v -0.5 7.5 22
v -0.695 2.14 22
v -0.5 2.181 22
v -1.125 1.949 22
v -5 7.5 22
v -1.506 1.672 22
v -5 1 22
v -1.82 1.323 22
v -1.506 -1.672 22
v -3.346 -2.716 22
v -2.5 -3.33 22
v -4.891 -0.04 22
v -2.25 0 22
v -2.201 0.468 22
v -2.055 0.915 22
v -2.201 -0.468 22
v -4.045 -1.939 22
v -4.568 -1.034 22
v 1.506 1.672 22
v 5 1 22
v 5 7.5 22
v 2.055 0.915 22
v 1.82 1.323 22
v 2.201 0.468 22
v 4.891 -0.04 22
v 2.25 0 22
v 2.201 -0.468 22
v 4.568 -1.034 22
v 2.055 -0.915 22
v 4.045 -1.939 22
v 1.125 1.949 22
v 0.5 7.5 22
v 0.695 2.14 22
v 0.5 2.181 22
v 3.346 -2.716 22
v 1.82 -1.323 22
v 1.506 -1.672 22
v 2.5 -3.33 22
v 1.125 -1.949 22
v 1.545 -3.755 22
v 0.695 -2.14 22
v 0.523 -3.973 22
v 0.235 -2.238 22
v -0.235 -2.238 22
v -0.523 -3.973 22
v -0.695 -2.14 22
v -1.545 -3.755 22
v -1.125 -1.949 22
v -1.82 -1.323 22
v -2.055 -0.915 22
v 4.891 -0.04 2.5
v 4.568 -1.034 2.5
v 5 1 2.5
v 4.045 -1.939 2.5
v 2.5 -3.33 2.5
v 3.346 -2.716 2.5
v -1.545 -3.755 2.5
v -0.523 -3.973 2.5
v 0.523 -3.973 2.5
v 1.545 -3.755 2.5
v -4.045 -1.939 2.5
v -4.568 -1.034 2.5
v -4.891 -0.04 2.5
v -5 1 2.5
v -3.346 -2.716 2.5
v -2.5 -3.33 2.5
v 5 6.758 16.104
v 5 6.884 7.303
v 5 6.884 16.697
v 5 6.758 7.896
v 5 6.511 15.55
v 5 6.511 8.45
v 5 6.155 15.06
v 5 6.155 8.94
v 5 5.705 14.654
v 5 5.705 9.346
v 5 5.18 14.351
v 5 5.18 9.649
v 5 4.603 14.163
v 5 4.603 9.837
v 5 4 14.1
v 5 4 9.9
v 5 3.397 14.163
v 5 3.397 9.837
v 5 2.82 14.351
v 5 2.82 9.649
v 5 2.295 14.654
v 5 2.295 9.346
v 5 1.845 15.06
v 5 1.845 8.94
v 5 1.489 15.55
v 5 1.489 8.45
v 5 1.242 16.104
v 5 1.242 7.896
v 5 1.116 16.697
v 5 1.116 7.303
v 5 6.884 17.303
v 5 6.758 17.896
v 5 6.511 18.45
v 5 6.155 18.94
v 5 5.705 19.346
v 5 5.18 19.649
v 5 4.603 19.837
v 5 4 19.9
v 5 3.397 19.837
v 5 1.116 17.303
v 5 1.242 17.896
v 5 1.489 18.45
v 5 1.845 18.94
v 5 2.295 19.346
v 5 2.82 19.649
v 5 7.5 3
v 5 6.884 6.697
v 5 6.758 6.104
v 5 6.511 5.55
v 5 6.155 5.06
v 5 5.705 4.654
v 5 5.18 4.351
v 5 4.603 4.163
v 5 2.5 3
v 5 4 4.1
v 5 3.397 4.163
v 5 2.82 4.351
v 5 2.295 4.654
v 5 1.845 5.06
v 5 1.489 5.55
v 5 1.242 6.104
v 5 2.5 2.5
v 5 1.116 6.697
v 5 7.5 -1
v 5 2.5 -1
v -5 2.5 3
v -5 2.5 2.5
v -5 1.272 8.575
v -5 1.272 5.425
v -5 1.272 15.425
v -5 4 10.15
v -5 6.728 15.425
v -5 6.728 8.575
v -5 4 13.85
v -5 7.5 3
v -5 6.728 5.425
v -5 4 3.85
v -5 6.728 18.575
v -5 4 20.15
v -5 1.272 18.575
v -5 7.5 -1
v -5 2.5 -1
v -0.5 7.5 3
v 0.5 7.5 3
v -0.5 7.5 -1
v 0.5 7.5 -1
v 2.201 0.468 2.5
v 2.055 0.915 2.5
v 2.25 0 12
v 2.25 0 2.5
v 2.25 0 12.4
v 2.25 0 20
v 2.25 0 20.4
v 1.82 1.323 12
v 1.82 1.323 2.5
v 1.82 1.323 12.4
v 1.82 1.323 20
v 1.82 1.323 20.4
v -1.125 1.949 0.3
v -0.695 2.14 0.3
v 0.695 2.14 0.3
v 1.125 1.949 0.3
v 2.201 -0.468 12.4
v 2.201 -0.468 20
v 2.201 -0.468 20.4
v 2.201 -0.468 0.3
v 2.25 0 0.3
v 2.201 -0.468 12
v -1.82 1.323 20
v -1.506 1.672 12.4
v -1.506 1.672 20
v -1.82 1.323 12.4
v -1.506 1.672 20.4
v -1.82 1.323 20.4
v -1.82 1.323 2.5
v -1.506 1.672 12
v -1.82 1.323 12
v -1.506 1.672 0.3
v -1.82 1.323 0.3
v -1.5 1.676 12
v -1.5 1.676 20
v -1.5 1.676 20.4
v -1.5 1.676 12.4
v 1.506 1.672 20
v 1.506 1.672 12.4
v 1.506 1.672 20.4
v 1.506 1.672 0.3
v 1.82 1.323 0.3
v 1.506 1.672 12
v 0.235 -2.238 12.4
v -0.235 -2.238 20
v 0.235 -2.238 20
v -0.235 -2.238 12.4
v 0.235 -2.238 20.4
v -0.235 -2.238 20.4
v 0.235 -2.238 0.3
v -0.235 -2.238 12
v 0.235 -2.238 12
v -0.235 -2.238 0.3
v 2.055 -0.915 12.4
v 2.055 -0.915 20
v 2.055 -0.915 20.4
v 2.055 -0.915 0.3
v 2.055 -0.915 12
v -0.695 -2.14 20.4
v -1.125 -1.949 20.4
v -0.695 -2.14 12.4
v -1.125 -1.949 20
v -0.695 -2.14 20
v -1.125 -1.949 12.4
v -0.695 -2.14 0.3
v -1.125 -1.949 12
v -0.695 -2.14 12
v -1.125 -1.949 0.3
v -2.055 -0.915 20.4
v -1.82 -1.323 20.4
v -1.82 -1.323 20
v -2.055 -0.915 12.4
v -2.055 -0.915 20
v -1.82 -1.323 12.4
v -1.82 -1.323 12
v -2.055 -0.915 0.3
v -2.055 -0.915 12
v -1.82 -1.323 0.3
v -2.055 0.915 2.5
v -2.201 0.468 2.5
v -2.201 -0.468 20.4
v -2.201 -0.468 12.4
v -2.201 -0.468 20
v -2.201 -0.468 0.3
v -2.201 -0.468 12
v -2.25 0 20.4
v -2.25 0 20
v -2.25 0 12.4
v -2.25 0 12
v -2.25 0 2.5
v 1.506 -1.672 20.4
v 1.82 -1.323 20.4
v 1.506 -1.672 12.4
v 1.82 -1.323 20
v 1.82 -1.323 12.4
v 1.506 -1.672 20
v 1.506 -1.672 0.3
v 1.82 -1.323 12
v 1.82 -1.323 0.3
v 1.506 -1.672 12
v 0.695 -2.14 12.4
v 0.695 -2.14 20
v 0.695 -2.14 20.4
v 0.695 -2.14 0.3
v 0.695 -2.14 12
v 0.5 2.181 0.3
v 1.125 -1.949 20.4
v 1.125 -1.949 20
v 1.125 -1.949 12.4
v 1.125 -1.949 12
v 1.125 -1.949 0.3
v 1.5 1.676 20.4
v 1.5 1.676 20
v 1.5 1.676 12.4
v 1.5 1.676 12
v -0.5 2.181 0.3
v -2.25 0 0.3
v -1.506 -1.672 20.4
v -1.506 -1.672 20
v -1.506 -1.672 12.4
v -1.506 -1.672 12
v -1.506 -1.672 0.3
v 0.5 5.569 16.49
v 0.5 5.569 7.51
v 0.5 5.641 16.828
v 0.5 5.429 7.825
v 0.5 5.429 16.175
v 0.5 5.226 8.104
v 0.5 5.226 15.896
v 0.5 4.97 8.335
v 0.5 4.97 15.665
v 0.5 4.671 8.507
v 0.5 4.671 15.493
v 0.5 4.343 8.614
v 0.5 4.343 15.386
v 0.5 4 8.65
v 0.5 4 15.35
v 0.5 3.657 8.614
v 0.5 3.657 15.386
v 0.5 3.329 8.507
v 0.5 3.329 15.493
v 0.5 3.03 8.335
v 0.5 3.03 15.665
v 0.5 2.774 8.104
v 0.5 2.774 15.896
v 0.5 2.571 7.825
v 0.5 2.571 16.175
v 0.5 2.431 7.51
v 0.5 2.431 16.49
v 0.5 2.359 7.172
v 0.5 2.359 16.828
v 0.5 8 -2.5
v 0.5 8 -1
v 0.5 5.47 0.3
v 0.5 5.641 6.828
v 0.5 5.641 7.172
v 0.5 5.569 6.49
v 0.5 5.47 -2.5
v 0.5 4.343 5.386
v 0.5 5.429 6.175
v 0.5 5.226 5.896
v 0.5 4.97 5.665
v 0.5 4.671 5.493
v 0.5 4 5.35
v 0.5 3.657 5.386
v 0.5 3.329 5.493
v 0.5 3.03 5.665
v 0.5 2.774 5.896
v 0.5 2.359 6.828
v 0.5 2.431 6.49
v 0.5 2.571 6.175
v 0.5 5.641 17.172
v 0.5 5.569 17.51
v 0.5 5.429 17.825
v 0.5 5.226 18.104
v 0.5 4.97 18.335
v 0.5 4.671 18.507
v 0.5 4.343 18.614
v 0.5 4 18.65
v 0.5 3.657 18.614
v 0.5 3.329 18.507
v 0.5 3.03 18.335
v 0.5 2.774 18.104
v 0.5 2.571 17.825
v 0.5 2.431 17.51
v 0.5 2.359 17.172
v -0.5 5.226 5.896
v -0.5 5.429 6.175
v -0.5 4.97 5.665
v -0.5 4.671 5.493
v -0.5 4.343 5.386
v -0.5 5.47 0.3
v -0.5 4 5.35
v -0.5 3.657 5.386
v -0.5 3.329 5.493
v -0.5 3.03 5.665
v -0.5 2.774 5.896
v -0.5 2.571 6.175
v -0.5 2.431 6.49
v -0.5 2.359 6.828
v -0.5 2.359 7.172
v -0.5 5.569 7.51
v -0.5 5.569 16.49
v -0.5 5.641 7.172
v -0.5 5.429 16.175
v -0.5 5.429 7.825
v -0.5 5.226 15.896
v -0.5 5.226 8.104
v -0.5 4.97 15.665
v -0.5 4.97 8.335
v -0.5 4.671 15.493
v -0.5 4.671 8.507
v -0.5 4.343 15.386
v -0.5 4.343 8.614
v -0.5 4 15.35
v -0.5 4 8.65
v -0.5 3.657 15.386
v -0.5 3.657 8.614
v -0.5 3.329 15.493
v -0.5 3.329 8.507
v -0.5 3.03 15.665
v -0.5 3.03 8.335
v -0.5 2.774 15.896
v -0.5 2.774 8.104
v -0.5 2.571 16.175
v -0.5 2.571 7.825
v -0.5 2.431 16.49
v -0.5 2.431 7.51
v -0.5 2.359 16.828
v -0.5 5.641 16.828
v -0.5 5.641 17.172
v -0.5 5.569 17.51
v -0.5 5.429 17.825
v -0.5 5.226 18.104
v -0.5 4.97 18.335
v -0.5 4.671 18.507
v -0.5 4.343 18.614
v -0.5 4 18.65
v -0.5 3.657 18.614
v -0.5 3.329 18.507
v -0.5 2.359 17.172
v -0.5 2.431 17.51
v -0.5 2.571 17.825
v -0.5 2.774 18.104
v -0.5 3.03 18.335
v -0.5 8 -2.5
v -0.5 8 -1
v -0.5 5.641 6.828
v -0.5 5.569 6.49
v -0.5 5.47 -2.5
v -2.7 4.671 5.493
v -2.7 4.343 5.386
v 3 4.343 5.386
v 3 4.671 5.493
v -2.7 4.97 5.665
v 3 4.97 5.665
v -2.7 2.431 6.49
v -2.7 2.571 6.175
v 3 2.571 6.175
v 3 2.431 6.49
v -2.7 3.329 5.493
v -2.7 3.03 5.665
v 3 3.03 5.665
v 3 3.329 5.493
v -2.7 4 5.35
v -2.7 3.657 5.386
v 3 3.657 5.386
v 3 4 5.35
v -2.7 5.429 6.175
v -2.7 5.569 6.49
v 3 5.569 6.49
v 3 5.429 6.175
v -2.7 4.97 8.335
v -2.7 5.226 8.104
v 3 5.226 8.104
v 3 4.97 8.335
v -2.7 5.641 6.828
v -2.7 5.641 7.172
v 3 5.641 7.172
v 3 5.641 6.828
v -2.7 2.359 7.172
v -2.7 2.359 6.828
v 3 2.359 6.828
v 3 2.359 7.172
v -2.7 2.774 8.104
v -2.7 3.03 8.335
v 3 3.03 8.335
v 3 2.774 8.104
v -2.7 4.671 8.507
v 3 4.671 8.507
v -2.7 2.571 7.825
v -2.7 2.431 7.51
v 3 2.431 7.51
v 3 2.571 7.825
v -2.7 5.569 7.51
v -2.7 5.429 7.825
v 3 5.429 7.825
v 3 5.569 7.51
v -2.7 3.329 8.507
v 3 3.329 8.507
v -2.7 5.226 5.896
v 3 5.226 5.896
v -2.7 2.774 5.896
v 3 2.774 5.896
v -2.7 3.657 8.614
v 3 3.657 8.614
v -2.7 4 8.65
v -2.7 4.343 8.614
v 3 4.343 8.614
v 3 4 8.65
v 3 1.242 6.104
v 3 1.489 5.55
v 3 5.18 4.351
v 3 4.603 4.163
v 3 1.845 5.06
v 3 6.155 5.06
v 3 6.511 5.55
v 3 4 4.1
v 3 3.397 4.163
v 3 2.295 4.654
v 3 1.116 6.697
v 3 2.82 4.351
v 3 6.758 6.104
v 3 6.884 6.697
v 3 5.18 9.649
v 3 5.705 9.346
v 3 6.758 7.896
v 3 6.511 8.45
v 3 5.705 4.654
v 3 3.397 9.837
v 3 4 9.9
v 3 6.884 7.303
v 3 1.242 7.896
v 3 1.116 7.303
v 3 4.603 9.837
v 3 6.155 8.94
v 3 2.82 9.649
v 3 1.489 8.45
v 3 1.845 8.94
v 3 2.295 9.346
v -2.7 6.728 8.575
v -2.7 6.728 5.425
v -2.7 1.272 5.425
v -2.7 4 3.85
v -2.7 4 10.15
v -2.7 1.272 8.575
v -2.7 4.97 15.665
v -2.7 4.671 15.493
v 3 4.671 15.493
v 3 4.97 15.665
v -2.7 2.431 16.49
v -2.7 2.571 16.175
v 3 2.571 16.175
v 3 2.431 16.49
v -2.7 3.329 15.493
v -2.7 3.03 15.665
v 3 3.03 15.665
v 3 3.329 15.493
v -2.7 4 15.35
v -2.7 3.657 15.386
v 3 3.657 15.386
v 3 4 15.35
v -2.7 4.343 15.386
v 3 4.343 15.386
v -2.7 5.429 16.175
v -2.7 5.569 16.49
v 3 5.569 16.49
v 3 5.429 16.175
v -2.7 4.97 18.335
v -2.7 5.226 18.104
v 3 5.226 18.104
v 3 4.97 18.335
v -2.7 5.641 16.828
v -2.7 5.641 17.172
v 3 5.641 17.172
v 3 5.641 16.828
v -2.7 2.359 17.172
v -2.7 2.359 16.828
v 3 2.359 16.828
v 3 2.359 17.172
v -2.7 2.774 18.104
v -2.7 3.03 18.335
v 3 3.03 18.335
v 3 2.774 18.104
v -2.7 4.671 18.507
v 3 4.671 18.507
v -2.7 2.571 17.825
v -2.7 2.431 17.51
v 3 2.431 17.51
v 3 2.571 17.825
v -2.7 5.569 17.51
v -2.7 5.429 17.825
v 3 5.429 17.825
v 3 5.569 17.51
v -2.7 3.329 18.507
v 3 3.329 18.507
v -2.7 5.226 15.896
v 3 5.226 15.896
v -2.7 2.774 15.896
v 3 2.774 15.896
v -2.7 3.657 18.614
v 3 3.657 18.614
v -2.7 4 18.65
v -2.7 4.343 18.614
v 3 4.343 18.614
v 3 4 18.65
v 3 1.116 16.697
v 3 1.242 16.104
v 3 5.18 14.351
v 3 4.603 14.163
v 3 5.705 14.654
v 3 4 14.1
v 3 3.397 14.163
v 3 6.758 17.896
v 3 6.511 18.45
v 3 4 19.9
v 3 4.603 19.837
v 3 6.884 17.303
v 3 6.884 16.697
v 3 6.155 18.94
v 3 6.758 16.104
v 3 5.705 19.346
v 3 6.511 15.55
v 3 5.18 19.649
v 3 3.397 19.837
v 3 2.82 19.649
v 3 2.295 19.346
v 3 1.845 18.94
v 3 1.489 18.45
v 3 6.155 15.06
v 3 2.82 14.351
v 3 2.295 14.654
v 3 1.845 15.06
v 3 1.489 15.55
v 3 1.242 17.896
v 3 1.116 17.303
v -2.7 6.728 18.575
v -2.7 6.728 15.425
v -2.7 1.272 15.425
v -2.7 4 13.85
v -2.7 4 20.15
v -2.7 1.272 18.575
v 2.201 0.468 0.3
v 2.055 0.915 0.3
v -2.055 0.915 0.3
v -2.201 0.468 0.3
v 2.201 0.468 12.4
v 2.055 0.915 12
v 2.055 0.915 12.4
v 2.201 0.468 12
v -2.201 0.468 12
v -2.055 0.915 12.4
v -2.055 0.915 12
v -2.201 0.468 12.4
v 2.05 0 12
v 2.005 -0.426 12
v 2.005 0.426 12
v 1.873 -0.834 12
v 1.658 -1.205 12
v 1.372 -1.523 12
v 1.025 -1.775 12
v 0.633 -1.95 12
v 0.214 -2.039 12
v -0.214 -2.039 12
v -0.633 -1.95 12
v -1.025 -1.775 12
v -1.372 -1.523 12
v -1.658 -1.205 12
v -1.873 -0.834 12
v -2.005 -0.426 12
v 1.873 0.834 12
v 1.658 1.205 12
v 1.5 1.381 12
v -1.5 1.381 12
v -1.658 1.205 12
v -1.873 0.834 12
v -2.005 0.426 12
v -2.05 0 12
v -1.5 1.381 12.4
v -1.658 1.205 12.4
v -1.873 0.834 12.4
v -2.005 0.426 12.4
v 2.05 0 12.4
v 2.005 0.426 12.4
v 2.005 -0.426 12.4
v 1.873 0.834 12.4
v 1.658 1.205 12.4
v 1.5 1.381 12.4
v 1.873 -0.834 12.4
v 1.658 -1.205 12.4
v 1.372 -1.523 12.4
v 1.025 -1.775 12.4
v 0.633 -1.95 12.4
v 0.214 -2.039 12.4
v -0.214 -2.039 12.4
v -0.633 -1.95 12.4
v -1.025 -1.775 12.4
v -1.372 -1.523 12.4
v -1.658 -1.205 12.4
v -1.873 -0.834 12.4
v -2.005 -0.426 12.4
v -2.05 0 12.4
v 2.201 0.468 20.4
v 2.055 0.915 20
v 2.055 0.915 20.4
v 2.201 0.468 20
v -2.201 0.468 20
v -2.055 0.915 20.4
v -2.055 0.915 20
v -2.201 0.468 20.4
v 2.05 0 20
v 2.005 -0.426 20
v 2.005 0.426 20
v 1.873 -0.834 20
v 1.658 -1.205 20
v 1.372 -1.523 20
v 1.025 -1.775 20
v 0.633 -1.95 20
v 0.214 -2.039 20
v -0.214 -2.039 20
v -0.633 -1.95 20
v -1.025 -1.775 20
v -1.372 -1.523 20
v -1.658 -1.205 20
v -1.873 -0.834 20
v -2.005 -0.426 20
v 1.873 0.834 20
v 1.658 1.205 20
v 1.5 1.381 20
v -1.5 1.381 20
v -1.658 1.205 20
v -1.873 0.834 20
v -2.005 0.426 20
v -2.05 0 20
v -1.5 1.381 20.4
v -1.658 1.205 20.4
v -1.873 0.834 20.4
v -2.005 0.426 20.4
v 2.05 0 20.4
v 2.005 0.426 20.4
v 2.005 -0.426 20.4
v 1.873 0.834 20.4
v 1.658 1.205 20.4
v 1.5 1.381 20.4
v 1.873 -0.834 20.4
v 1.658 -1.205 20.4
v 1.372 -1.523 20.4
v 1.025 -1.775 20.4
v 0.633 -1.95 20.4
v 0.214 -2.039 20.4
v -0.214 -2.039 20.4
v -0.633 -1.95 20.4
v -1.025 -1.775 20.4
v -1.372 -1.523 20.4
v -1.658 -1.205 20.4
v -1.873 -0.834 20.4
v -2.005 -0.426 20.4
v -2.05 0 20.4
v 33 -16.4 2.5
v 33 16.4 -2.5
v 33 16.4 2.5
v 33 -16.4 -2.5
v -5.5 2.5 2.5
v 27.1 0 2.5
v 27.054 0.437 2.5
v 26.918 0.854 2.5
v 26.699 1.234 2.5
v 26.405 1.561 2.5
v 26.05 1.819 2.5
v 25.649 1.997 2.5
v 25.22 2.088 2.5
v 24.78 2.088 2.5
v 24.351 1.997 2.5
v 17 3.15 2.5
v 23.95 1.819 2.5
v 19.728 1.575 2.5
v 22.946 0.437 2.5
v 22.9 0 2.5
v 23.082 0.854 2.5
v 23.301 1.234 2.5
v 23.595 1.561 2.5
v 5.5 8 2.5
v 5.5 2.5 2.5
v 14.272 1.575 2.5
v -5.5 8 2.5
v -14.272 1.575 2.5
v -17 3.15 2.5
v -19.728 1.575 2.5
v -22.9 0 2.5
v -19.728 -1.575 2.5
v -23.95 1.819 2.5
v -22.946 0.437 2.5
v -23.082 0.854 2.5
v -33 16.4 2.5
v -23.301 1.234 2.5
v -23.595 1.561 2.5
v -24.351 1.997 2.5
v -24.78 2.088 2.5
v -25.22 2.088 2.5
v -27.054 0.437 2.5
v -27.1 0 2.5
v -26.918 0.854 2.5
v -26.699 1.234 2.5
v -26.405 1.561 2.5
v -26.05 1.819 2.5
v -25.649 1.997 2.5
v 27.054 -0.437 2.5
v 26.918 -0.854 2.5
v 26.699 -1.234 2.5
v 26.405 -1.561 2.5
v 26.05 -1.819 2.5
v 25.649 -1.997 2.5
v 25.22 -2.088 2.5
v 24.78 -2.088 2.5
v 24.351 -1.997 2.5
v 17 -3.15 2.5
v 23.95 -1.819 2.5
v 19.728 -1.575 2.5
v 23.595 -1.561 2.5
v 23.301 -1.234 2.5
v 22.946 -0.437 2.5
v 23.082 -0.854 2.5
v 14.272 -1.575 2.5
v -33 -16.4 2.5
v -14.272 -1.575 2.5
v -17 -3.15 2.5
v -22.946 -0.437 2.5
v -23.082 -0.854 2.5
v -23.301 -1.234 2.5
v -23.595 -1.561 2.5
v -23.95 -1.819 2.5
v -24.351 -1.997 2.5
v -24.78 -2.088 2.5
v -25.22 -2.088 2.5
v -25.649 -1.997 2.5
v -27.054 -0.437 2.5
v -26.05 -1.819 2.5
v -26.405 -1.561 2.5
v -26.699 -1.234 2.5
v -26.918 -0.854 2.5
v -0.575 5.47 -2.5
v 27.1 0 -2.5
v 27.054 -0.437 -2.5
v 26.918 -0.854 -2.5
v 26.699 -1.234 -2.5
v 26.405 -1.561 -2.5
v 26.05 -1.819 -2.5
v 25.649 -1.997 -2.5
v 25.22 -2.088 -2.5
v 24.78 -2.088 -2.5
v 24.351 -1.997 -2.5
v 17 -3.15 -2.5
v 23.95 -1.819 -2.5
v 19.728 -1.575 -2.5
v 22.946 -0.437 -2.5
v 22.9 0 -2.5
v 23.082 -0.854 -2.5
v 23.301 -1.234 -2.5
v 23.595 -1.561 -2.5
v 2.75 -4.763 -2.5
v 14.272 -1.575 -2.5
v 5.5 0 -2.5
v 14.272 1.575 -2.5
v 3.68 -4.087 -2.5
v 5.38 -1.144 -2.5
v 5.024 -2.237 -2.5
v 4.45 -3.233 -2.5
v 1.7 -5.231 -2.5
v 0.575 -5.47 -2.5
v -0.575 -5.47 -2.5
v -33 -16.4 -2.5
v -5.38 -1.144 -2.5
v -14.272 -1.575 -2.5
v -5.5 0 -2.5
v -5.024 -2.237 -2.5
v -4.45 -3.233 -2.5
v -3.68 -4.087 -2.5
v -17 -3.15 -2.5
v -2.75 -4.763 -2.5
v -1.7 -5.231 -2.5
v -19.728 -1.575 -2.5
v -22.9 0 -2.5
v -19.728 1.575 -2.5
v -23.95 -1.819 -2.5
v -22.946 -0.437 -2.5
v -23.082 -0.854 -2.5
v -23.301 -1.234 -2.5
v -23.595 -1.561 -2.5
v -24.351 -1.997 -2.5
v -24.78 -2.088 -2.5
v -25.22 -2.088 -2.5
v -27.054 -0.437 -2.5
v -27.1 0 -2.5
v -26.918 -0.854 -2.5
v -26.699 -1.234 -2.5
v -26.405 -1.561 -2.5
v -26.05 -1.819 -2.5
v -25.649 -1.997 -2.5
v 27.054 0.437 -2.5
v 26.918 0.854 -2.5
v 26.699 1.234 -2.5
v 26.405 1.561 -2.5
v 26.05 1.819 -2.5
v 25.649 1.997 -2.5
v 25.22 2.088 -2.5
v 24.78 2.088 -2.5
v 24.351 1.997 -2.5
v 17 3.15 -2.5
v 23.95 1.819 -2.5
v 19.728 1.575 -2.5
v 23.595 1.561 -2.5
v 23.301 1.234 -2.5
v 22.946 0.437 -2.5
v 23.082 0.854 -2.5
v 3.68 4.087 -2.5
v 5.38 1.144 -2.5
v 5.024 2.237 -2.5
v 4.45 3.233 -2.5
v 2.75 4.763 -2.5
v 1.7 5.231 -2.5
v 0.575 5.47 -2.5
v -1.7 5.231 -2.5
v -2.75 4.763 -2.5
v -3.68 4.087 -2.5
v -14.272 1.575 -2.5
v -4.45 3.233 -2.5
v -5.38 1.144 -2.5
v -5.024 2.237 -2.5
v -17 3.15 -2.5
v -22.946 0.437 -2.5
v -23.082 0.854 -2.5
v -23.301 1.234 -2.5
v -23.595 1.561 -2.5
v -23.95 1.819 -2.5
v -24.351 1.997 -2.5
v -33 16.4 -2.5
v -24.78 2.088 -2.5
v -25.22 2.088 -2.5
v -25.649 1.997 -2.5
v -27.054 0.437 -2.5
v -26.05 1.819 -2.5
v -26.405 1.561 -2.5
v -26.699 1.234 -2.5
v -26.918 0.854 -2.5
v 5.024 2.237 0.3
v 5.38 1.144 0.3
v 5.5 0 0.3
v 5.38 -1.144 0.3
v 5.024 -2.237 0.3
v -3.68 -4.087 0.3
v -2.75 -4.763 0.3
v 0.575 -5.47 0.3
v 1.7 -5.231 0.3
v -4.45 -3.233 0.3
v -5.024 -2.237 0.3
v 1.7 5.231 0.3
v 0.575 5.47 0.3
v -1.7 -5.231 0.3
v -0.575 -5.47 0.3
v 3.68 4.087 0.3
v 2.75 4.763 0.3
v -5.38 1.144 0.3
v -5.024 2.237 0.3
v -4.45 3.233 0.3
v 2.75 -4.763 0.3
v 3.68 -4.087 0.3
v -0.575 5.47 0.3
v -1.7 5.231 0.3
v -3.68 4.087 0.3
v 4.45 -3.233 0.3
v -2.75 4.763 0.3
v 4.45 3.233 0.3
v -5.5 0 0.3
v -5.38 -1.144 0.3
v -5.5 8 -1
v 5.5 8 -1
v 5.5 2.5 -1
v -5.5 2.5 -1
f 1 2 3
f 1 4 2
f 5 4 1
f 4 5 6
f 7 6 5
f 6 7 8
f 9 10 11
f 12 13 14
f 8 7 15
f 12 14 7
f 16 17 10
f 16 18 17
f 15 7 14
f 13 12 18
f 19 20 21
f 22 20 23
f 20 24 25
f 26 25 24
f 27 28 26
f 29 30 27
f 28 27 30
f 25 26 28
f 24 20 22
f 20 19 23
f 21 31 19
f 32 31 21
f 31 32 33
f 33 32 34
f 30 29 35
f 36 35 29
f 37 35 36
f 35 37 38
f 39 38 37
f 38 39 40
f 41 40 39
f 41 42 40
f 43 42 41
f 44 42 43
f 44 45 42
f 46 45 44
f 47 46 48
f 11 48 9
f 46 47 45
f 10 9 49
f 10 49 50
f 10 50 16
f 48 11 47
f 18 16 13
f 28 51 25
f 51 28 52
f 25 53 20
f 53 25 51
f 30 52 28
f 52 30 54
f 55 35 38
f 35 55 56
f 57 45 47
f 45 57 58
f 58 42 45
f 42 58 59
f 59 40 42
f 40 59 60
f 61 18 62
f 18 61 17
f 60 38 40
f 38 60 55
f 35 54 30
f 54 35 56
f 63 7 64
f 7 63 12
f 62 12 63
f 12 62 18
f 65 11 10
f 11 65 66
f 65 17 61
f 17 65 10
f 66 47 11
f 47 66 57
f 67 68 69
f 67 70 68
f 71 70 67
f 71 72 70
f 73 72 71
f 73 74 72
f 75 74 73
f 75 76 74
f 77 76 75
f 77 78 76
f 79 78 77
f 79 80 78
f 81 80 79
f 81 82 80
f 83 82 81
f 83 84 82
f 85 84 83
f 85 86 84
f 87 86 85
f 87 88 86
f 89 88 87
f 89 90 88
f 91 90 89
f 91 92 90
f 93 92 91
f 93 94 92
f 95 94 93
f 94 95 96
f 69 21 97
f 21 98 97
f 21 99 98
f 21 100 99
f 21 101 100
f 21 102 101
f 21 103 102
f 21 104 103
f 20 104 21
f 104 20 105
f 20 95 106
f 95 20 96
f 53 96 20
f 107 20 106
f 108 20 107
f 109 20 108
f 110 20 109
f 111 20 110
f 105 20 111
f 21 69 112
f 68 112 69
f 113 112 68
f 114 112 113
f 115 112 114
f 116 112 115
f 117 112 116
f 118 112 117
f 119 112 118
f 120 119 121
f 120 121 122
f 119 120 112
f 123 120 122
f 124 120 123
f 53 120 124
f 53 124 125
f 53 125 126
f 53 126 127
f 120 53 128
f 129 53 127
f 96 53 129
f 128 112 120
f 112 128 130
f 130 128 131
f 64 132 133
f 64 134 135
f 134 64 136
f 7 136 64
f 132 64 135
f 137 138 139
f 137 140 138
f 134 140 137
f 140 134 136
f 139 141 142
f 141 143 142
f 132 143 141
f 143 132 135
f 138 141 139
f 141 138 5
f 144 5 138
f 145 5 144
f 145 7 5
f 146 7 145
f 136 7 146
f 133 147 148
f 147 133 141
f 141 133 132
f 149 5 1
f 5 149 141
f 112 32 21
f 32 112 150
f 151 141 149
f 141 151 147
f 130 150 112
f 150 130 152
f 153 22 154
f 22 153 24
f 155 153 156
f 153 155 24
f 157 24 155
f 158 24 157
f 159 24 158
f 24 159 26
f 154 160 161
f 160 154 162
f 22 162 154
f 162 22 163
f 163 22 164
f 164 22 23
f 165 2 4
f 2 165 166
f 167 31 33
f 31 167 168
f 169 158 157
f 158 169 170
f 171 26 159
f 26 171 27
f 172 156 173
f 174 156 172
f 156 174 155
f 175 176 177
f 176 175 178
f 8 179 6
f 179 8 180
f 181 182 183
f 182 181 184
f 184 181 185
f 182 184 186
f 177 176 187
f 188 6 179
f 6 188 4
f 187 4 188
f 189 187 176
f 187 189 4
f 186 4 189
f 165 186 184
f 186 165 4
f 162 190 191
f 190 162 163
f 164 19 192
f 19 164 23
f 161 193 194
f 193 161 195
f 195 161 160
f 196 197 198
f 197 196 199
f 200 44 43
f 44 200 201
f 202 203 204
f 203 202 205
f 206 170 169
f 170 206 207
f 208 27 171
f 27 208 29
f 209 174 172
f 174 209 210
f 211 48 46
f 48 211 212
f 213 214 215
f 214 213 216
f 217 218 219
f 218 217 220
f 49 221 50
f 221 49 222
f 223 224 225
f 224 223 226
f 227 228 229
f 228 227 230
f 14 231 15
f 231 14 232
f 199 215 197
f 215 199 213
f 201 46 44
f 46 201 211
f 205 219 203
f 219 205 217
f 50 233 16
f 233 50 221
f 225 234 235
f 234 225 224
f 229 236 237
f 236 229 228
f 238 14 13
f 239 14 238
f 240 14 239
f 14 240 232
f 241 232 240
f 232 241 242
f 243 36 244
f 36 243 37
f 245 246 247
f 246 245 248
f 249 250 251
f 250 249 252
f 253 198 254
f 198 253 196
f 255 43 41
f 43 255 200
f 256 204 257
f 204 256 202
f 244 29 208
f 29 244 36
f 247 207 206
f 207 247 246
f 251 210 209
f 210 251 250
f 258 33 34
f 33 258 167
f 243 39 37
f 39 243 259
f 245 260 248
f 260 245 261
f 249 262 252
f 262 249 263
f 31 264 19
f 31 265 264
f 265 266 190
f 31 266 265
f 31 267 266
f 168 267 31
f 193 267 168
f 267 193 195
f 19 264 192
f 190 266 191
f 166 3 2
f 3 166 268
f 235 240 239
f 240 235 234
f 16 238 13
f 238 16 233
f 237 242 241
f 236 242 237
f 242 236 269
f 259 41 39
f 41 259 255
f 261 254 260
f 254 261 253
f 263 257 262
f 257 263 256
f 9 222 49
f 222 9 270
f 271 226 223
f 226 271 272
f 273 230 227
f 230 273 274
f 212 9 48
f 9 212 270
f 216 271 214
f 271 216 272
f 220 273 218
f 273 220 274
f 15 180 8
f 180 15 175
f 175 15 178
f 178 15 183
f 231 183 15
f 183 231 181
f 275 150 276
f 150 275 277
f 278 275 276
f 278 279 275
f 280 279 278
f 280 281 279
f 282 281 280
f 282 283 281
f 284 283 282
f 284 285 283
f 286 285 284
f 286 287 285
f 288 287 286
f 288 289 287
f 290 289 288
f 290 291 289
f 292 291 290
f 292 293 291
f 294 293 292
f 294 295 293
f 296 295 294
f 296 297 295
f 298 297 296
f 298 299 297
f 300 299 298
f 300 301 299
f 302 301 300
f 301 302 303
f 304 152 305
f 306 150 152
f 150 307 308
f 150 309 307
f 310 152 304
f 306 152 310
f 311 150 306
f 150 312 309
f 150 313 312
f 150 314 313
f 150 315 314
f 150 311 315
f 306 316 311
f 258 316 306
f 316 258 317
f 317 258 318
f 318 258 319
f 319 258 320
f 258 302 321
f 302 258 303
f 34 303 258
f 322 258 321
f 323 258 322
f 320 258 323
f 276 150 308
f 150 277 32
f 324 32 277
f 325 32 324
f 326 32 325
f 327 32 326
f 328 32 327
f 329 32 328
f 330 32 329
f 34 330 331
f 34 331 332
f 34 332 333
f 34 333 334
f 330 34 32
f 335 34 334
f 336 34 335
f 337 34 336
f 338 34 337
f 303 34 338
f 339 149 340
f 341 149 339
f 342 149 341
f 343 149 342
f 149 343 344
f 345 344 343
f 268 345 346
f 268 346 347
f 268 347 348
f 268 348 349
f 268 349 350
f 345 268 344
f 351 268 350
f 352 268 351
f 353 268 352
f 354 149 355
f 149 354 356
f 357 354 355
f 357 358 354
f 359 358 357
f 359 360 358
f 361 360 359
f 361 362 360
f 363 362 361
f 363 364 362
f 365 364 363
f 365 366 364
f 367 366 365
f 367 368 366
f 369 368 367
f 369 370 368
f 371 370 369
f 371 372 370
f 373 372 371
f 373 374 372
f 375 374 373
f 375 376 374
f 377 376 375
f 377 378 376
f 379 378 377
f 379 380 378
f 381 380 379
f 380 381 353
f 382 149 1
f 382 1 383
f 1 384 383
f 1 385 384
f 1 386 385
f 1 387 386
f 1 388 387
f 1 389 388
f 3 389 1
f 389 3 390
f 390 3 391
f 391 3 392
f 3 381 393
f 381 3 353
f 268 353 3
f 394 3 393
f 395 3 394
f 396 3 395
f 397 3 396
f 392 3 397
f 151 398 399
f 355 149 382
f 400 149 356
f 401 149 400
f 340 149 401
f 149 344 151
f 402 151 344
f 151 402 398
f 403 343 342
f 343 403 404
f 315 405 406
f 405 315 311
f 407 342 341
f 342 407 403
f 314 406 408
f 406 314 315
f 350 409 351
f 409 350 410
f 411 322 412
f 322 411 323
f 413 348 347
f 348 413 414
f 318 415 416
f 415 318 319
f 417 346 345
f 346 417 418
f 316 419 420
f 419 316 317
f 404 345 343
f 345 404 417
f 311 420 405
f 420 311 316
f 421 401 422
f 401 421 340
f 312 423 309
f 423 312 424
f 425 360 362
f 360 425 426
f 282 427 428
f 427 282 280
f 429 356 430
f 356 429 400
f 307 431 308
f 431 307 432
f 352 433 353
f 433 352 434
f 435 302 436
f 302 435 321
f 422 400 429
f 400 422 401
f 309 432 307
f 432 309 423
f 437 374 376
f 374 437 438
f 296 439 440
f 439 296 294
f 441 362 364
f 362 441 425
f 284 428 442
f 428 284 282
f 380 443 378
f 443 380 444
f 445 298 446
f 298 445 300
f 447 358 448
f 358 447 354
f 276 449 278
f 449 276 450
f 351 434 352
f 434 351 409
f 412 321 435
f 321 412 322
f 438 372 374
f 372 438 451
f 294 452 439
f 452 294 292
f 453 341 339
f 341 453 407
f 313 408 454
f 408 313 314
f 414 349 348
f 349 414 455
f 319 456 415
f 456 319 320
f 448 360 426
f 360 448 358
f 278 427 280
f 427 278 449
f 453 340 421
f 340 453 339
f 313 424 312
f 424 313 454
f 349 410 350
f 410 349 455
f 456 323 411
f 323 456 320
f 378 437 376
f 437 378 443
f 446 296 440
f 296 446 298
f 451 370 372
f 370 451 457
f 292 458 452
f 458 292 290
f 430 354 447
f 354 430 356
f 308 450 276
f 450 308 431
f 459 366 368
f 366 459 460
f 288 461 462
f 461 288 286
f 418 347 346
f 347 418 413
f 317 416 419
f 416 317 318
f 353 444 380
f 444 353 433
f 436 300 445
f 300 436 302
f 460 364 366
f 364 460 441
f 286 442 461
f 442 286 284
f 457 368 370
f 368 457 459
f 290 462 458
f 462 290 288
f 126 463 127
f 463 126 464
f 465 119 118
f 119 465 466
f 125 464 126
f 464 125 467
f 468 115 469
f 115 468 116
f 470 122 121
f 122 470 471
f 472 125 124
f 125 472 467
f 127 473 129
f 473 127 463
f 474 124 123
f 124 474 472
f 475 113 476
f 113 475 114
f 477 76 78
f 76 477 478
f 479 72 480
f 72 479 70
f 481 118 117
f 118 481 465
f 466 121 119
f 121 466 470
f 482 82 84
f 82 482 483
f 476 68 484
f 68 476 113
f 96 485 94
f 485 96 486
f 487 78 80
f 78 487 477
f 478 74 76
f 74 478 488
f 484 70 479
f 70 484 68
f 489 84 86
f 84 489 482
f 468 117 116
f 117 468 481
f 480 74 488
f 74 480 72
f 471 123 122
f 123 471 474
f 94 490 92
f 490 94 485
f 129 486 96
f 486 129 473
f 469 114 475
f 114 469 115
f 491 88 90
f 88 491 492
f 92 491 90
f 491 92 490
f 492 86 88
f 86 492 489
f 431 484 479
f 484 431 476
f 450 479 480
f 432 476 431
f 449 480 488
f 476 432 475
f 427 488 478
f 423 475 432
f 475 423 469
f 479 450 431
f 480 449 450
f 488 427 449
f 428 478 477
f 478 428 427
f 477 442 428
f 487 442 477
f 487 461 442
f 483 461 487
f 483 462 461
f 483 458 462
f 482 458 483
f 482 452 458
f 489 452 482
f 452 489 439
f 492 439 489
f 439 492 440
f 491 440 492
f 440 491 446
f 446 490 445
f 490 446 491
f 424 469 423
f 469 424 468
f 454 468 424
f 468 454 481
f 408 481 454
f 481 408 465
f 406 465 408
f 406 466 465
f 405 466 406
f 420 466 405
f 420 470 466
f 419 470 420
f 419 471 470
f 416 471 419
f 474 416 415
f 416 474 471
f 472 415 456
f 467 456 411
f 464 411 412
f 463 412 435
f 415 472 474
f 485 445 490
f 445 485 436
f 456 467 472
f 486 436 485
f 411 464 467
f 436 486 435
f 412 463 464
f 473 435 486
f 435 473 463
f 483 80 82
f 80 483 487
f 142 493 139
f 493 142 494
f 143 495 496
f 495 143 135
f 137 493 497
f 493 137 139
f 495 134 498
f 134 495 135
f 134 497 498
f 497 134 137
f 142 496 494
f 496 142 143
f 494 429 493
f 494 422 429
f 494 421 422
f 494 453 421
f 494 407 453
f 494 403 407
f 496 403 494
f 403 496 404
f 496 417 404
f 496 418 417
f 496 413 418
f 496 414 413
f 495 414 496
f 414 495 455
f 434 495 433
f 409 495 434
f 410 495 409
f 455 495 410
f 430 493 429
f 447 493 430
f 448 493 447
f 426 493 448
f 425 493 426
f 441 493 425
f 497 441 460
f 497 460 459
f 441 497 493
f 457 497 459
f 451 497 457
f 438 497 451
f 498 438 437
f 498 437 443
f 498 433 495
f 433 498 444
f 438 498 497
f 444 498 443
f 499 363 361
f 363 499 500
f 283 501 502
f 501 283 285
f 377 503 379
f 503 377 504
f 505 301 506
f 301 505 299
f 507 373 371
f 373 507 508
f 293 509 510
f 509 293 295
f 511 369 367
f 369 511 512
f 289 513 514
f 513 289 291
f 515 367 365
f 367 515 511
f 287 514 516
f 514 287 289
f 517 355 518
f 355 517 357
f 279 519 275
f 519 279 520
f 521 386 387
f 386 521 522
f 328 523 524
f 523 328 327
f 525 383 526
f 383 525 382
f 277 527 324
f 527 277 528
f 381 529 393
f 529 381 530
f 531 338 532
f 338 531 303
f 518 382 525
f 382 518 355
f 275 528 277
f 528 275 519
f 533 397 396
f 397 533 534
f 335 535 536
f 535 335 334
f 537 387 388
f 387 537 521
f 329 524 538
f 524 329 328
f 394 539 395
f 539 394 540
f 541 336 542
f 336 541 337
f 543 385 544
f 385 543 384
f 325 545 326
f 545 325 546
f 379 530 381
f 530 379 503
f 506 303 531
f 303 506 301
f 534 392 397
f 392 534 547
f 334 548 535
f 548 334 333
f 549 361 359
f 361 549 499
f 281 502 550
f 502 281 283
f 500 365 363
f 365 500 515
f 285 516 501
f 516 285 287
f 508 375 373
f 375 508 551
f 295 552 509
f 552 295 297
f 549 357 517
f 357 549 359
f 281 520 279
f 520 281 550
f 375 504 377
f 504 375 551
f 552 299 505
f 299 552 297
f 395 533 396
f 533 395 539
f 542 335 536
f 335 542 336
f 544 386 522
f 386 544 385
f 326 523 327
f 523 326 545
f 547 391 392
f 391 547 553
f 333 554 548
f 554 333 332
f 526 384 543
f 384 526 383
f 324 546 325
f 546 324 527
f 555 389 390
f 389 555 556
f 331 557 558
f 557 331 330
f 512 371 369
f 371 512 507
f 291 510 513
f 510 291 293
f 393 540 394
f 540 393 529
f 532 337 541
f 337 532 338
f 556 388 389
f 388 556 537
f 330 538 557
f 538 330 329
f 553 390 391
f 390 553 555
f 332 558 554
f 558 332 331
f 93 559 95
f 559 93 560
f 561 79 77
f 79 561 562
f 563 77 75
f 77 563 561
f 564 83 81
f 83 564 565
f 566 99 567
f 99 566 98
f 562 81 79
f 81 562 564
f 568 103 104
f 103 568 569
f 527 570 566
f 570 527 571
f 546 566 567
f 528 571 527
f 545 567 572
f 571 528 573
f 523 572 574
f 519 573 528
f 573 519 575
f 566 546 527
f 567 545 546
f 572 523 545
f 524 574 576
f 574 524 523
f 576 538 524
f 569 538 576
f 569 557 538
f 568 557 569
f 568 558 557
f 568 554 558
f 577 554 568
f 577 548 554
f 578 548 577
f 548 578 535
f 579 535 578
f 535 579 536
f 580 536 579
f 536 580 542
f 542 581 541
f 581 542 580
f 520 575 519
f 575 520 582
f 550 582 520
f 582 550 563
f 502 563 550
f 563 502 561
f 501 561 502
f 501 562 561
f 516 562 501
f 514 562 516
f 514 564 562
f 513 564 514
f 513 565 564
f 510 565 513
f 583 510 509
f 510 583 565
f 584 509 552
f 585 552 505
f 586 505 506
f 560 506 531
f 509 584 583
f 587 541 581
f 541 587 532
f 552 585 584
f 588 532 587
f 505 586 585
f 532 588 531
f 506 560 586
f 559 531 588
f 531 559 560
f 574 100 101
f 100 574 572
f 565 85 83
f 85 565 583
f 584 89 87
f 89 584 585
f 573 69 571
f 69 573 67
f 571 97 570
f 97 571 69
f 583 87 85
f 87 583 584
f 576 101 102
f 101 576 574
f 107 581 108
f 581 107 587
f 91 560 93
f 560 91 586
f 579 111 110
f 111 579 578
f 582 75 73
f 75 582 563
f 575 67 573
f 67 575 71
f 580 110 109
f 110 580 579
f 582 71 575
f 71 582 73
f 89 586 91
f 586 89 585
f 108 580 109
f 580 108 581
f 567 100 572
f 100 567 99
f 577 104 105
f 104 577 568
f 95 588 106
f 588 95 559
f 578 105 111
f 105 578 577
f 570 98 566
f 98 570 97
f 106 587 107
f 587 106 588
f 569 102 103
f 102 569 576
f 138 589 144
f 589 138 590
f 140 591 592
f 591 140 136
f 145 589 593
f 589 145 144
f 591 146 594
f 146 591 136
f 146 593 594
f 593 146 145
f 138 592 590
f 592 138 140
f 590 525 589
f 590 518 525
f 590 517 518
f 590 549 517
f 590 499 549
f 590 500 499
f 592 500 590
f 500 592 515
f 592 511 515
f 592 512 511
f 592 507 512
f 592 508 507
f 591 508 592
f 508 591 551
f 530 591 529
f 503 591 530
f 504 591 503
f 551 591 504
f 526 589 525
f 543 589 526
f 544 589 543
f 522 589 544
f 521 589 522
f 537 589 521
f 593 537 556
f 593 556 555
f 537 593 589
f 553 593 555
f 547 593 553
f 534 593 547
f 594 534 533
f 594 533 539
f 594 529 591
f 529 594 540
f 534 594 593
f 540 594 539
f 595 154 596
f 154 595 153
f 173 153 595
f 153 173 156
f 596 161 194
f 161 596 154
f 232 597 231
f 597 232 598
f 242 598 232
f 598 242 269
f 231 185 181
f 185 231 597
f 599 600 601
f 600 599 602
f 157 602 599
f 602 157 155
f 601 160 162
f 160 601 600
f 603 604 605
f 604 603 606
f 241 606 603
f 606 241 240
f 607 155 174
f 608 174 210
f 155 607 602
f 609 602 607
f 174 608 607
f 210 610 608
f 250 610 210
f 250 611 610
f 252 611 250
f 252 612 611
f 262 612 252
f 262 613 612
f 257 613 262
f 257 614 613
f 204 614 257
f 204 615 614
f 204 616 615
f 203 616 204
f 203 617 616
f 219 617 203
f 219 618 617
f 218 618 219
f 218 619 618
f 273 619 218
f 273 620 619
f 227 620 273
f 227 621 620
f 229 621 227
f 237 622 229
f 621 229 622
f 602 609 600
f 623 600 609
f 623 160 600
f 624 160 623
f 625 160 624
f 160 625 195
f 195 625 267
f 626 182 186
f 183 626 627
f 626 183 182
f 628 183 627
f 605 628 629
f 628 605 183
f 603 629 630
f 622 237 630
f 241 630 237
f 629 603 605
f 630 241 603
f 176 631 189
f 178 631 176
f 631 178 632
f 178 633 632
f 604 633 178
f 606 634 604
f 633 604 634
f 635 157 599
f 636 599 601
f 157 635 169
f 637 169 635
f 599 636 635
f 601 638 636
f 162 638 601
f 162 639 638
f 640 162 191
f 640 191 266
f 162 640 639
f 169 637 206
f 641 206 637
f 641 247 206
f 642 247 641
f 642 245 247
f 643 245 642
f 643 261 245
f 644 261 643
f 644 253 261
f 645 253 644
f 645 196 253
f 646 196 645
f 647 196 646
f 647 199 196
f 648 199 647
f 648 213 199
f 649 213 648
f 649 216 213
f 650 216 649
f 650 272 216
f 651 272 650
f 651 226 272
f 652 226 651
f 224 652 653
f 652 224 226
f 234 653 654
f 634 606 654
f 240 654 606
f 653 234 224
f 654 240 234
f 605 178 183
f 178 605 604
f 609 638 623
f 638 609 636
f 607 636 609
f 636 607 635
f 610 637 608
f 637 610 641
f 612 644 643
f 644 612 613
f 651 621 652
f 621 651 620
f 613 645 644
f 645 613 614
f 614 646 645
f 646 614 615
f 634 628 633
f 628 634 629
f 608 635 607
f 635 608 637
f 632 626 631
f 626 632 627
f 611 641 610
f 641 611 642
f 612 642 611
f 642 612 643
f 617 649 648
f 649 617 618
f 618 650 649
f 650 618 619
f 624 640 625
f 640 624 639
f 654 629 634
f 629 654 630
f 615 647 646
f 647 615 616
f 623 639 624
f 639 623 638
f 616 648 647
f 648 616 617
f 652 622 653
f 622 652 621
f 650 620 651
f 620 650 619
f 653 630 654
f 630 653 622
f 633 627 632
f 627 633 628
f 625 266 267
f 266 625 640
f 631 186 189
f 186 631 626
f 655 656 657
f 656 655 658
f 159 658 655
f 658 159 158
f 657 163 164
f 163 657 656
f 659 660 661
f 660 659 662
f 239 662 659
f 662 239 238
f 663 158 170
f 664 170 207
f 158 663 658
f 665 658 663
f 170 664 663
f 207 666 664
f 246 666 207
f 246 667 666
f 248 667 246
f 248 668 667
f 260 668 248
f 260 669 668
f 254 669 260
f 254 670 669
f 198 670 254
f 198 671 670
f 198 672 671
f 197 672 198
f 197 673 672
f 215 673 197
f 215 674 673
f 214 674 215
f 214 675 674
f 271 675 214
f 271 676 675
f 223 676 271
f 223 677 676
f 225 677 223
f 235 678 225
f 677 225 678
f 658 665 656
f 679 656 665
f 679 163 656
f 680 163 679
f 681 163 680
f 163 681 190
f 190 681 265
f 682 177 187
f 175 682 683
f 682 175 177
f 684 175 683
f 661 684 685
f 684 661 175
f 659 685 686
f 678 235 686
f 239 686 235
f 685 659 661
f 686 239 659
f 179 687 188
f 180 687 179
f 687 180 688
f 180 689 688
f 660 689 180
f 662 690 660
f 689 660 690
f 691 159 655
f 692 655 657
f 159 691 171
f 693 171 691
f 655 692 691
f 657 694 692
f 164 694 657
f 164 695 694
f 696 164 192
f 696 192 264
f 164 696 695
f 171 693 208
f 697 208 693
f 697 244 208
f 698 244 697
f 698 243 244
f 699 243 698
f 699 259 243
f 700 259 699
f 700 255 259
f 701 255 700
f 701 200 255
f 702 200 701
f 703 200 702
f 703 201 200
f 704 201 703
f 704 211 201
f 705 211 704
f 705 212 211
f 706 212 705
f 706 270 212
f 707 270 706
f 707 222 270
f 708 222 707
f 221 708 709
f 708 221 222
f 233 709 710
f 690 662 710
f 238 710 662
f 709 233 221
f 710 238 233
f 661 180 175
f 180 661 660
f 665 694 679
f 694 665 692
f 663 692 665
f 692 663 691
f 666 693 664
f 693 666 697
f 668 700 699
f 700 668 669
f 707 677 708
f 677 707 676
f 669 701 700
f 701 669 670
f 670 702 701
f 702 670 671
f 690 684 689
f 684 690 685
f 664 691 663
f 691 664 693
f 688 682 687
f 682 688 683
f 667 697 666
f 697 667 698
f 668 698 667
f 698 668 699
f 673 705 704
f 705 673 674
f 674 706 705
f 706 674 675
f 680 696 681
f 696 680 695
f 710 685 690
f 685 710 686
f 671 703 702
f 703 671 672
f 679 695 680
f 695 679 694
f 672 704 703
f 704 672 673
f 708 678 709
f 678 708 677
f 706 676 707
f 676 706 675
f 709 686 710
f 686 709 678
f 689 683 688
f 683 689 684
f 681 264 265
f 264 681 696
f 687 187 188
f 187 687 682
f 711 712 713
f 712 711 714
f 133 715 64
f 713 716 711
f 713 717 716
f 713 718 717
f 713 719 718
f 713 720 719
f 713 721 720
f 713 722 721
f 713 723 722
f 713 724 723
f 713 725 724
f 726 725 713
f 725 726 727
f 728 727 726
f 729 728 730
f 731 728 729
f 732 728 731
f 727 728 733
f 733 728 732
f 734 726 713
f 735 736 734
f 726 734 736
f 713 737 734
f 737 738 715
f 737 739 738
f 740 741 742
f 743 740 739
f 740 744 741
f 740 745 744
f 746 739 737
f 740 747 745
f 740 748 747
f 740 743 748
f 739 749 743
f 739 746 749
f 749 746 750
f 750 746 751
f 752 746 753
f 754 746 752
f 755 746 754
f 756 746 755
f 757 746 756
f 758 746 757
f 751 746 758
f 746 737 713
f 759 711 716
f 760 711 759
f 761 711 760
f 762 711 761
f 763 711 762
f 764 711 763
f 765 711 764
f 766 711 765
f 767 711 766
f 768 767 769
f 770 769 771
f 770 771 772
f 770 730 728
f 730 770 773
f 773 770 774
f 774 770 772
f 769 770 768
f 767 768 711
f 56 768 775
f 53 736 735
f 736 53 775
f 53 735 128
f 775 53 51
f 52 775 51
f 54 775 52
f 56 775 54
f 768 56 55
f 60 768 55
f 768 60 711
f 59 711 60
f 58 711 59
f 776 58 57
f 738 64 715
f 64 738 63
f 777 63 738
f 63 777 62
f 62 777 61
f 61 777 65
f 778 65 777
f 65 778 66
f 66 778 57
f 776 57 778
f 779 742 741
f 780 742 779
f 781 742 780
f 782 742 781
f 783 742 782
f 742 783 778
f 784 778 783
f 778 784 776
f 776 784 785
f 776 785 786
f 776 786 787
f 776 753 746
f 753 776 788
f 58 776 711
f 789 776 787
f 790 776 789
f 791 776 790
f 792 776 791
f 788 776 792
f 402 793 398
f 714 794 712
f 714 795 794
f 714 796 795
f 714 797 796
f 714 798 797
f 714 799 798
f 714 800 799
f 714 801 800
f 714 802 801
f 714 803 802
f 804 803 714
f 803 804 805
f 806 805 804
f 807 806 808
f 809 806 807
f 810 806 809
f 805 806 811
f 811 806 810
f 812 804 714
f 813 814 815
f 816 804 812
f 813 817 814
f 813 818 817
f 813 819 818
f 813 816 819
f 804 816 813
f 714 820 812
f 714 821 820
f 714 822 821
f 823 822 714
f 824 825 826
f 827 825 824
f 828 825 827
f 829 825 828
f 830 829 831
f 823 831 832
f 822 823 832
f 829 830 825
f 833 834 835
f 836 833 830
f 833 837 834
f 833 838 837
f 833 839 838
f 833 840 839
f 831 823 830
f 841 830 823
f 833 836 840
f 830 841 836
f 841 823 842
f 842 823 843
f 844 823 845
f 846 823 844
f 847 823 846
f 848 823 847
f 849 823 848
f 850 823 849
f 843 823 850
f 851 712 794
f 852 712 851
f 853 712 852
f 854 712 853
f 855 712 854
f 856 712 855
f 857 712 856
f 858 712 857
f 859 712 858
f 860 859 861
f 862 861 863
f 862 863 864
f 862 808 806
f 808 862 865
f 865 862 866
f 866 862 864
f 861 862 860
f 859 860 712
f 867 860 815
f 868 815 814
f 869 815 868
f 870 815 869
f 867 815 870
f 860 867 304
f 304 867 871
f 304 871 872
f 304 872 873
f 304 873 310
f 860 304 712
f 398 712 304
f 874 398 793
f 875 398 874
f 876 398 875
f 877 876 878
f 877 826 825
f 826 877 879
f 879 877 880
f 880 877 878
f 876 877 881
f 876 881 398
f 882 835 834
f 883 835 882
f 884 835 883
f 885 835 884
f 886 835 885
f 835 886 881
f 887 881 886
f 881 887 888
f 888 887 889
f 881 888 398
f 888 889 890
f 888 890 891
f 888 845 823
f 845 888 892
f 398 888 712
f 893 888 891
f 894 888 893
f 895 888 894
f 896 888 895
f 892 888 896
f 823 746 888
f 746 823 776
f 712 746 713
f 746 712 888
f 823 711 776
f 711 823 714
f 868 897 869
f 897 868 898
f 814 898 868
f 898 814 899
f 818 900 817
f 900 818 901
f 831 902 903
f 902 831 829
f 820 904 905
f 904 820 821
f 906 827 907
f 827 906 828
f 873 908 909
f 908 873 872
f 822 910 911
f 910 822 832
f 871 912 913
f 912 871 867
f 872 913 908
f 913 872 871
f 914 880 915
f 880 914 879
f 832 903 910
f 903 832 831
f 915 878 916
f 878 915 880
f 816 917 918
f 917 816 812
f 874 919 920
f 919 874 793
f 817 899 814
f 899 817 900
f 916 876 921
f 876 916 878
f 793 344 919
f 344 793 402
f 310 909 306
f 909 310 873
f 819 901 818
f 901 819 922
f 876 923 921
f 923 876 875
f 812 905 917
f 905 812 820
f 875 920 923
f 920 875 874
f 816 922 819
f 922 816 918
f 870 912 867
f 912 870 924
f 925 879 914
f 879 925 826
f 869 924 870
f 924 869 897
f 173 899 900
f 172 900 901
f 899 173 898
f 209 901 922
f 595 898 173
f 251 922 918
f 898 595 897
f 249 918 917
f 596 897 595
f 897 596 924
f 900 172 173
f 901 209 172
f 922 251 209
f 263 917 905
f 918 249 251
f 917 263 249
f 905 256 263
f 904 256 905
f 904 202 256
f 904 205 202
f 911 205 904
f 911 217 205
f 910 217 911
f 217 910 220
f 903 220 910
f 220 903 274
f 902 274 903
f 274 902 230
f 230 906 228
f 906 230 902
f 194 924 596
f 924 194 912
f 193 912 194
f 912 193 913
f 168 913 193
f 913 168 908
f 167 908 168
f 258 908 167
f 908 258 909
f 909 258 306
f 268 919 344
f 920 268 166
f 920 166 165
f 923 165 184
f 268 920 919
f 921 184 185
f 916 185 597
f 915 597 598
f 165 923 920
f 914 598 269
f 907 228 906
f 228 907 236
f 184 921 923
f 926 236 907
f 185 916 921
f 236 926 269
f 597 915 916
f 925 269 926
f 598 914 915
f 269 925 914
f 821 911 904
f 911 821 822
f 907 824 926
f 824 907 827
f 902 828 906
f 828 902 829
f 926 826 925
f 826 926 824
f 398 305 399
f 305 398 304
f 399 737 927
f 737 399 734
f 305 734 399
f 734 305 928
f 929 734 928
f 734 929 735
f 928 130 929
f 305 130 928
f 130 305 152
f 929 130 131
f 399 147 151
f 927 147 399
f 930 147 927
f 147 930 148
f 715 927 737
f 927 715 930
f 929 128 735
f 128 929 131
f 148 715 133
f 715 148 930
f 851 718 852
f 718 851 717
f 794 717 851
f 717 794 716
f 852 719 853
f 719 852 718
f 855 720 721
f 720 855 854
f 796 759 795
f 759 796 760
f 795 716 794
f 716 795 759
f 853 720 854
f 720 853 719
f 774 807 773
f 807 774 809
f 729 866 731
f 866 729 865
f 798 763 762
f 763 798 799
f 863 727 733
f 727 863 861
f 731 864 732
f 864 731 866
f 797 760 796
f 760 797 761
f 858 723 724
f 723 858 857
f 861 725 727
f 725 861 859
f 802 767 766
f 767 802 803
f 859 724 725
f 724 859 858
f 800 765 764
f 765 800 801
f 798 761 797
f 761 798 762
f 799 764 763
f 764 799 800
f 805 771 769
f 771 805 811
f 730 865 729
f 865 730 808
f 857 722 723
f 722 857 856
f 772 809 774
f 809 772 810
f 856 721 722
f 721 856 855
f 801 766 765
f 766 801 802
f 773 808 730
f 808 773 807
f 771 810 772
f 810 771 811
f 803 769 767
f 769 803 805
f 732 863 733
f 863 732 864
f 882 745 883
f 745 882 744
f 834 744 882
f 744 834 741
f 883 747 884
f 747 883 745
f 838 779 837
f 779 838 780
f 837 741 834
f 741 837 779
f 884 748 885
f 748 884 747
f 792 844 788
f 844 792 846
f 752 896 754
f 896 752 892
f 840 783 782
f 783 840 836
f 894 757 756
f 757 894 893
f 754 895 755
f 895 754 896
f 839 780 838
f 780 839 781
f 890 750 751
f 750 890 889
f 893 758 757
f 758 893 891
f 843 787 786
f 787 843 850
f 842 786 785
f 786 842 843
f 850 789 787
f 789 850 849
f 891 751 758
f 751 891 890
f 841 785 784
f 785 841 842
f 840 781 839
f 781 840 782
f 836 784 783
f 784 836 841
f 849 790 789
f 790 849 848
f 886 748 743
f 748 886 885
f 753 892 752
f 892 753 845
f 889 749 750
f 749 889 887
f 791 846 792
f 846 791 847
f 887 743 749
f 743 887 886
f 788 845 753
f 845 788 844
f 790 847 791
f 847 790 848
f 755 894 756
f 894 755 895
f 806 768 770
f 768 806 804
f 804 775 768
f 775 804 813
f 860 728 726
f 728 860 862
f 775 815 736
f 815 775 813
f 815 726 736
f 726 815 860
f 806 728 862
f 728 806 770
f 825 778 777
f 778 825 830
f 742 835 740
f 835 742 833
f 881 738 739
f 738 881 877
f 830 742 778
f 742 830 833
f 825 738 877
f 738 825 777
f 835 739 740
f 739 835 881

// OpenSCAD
// file: ../Dollo/NEW_Long_ties/globals.scad
/*
Most things in this file is represented as one millimeter, so keep that in mind while changing things.
Some of the setting are not mm but at variables that you can set, such as 2*x=2x and you are setting what x is.
I will try to specify when things are variables and not exact measurements.
*/

// printer slop
slop = 0.15;

obj_leg = 30;
leg_length = 5.5;
small_number = 0.001;
metal_core_rode_global = 5;


///////////////// number of holes /////////////////////
z_hole_number = 8;
other_holes = 8;

///////////////// Pins /////////////////////

//pins that poke out
ball_size = 10;
pin_height = 20;
pin_diameter = 6;


//holes
hole_ball_size = ball_size;
hole_pin_height = pin_height;
hole_pin_diameter = pin_diameter;

///////////////// Z THINGS /////////////////////

berring_slot_width = 7.5;
berring_slot_depth = 6.5;
metal_core_rode = 5;

///////////////// X THINGS /////////////////////

//male dove tails
male_dove_max_width=8;
male_dove_min_width=5;
male_dove_depth=5;
male_dove_height=obj_leg/2;

function scaled_male_dove_max_width() = male_dove_max_width - slop;
function scaled_male_dove_min_width() = male_dove_min_width - slop;
function scaled_male_dove_depth() = male_dove_depth - slop;

//female dove tails, this is found on the y mounts
girl_max_width=11;
girl_min_width=5;
girl_depth=5;
girl_height=obj_leg;


///////////////// Y THINGS /////////////////////
/*
The Y is so normal that all of those global variables at the top should change all of the setting in it, this section is set her incase there are variables set in the future development of this project.
*/

// stepper
motor_side_length = 43.2;
motor_bolt_hole_distance = 31;
motor_center_hole = 23;
motor_shaft_dia = 5;
motor_shaft_hole_dia = 5+2*slop;

// bolts etc.
bolt_hole_dia = 3+2*slop;
bolt_head_hole_dia = 5.8;

m4_bolt_hole_dia = 4+2*slop;
m4_bolt_head_hole_dia = 6.8+2*slop;


m3_nut_side = 5.65;
m3_nut_height = 2.3;
m4_nut_side = 6.85;
m4_nut_height = 3.1;

// threaded rod
lifter_rod_diam = 9.86;
hole_threaded_rod = lifter_rod_diam+2*slop;

// for the extensions
metal_rod_size = 9;
// main file
include <../Dollo/NEW_Long_ties/globals.scad>;
include <../Dollo/NEW_Long_ties/include.scad>;

$fn=30;

tube_hole = 4.5;
height = 20;


//clamp();

extruder_clamp();


module clamp() {
    difference() {
        union() {
            cylinder(d=10, h=height);

            translate([0, 3.25, height/2])
            cube([10, 6.5, height], center=true);
        }
        translate([0, -1, 0])
        cylinder(d=tube_hole, h=height);

        translate([0, 3, height/2])
        cube([1, 7, height], center=true);
        
        translate([-5, 3, 5])
        rotate([0, 90, 0])
        cylinder(d=bolt_hole_dia, h=10);

        translate([3, 3, 5])
        rotate([0, 90, 0])
        cylinder(d=bolt_head_hole_dia, h=3);

        translate([-5.1, 3, 5])
        rotate([0, 90, 0])
        M3_nut(cone=false);

        translate([-5, 3, height - 5])
        rotate([0, 90, 0])
        cylinder(d=bolt_hole_dia, h=10);

        translate([3, 3, height - 5])
        rotate([0, 90, 0])
        cylinder(d=bolt_head_hole_dia, h=3);

        translate([-5.1, 3, height - 5])
        rotate([0, 90, 0])
        M3_nut(cone=false);
    }
    
    module ring() {
        difference() {
            cylinder(d=tube_hole,h=0.4);
            cylinder(d=tube_hole - 0.4, h=0.4);

            translate([0, 4, height/2])
            cube([3, 7, 25], center=true);
        }
    }

    translate([0, -1, 2])
    ring();

    translate([0, -1, height/2])
    ring();

    translate([0, -1, height - 2])
    ring();
}

module extruder_clamp() {
    difference() {
        union() {
            cube([66, 32.8, 5], center=true);

            translate([0, 1, 2])
            clamp();
        }
        
        translate([0, 0, -5/2])
        cylinder(d=tube_hole, h=10);

        translate([0, 0, -5/2])
        cylinder(d=11, h=2.8);

        translate([0, 5, 0])
        cube([1, 6, 5], center=true);

        translate([0, 7.75, 1])
        cube([11, 0.5, 4], center=true);

        translate([5.25, 5, 1])
        cube([0.5, 5, 4], center=true);

        translate([-5.25, 5, 1])
        cube([0.5, 5, 4], center=true);

        translate([50/2, 0, -5])
        cylinder(d=4.2, h=10);

        translate([-50/2, 0, -5])
        cylinder(d=4.2, h=10);

        translate([34/2, 0, -5])
        rotate([0, 0, 90])
        M3_nut(10);

        translate([-34/2, 0, -5])
        rotate([0, 0, 90])
        M3_nut(10);
    }
}
